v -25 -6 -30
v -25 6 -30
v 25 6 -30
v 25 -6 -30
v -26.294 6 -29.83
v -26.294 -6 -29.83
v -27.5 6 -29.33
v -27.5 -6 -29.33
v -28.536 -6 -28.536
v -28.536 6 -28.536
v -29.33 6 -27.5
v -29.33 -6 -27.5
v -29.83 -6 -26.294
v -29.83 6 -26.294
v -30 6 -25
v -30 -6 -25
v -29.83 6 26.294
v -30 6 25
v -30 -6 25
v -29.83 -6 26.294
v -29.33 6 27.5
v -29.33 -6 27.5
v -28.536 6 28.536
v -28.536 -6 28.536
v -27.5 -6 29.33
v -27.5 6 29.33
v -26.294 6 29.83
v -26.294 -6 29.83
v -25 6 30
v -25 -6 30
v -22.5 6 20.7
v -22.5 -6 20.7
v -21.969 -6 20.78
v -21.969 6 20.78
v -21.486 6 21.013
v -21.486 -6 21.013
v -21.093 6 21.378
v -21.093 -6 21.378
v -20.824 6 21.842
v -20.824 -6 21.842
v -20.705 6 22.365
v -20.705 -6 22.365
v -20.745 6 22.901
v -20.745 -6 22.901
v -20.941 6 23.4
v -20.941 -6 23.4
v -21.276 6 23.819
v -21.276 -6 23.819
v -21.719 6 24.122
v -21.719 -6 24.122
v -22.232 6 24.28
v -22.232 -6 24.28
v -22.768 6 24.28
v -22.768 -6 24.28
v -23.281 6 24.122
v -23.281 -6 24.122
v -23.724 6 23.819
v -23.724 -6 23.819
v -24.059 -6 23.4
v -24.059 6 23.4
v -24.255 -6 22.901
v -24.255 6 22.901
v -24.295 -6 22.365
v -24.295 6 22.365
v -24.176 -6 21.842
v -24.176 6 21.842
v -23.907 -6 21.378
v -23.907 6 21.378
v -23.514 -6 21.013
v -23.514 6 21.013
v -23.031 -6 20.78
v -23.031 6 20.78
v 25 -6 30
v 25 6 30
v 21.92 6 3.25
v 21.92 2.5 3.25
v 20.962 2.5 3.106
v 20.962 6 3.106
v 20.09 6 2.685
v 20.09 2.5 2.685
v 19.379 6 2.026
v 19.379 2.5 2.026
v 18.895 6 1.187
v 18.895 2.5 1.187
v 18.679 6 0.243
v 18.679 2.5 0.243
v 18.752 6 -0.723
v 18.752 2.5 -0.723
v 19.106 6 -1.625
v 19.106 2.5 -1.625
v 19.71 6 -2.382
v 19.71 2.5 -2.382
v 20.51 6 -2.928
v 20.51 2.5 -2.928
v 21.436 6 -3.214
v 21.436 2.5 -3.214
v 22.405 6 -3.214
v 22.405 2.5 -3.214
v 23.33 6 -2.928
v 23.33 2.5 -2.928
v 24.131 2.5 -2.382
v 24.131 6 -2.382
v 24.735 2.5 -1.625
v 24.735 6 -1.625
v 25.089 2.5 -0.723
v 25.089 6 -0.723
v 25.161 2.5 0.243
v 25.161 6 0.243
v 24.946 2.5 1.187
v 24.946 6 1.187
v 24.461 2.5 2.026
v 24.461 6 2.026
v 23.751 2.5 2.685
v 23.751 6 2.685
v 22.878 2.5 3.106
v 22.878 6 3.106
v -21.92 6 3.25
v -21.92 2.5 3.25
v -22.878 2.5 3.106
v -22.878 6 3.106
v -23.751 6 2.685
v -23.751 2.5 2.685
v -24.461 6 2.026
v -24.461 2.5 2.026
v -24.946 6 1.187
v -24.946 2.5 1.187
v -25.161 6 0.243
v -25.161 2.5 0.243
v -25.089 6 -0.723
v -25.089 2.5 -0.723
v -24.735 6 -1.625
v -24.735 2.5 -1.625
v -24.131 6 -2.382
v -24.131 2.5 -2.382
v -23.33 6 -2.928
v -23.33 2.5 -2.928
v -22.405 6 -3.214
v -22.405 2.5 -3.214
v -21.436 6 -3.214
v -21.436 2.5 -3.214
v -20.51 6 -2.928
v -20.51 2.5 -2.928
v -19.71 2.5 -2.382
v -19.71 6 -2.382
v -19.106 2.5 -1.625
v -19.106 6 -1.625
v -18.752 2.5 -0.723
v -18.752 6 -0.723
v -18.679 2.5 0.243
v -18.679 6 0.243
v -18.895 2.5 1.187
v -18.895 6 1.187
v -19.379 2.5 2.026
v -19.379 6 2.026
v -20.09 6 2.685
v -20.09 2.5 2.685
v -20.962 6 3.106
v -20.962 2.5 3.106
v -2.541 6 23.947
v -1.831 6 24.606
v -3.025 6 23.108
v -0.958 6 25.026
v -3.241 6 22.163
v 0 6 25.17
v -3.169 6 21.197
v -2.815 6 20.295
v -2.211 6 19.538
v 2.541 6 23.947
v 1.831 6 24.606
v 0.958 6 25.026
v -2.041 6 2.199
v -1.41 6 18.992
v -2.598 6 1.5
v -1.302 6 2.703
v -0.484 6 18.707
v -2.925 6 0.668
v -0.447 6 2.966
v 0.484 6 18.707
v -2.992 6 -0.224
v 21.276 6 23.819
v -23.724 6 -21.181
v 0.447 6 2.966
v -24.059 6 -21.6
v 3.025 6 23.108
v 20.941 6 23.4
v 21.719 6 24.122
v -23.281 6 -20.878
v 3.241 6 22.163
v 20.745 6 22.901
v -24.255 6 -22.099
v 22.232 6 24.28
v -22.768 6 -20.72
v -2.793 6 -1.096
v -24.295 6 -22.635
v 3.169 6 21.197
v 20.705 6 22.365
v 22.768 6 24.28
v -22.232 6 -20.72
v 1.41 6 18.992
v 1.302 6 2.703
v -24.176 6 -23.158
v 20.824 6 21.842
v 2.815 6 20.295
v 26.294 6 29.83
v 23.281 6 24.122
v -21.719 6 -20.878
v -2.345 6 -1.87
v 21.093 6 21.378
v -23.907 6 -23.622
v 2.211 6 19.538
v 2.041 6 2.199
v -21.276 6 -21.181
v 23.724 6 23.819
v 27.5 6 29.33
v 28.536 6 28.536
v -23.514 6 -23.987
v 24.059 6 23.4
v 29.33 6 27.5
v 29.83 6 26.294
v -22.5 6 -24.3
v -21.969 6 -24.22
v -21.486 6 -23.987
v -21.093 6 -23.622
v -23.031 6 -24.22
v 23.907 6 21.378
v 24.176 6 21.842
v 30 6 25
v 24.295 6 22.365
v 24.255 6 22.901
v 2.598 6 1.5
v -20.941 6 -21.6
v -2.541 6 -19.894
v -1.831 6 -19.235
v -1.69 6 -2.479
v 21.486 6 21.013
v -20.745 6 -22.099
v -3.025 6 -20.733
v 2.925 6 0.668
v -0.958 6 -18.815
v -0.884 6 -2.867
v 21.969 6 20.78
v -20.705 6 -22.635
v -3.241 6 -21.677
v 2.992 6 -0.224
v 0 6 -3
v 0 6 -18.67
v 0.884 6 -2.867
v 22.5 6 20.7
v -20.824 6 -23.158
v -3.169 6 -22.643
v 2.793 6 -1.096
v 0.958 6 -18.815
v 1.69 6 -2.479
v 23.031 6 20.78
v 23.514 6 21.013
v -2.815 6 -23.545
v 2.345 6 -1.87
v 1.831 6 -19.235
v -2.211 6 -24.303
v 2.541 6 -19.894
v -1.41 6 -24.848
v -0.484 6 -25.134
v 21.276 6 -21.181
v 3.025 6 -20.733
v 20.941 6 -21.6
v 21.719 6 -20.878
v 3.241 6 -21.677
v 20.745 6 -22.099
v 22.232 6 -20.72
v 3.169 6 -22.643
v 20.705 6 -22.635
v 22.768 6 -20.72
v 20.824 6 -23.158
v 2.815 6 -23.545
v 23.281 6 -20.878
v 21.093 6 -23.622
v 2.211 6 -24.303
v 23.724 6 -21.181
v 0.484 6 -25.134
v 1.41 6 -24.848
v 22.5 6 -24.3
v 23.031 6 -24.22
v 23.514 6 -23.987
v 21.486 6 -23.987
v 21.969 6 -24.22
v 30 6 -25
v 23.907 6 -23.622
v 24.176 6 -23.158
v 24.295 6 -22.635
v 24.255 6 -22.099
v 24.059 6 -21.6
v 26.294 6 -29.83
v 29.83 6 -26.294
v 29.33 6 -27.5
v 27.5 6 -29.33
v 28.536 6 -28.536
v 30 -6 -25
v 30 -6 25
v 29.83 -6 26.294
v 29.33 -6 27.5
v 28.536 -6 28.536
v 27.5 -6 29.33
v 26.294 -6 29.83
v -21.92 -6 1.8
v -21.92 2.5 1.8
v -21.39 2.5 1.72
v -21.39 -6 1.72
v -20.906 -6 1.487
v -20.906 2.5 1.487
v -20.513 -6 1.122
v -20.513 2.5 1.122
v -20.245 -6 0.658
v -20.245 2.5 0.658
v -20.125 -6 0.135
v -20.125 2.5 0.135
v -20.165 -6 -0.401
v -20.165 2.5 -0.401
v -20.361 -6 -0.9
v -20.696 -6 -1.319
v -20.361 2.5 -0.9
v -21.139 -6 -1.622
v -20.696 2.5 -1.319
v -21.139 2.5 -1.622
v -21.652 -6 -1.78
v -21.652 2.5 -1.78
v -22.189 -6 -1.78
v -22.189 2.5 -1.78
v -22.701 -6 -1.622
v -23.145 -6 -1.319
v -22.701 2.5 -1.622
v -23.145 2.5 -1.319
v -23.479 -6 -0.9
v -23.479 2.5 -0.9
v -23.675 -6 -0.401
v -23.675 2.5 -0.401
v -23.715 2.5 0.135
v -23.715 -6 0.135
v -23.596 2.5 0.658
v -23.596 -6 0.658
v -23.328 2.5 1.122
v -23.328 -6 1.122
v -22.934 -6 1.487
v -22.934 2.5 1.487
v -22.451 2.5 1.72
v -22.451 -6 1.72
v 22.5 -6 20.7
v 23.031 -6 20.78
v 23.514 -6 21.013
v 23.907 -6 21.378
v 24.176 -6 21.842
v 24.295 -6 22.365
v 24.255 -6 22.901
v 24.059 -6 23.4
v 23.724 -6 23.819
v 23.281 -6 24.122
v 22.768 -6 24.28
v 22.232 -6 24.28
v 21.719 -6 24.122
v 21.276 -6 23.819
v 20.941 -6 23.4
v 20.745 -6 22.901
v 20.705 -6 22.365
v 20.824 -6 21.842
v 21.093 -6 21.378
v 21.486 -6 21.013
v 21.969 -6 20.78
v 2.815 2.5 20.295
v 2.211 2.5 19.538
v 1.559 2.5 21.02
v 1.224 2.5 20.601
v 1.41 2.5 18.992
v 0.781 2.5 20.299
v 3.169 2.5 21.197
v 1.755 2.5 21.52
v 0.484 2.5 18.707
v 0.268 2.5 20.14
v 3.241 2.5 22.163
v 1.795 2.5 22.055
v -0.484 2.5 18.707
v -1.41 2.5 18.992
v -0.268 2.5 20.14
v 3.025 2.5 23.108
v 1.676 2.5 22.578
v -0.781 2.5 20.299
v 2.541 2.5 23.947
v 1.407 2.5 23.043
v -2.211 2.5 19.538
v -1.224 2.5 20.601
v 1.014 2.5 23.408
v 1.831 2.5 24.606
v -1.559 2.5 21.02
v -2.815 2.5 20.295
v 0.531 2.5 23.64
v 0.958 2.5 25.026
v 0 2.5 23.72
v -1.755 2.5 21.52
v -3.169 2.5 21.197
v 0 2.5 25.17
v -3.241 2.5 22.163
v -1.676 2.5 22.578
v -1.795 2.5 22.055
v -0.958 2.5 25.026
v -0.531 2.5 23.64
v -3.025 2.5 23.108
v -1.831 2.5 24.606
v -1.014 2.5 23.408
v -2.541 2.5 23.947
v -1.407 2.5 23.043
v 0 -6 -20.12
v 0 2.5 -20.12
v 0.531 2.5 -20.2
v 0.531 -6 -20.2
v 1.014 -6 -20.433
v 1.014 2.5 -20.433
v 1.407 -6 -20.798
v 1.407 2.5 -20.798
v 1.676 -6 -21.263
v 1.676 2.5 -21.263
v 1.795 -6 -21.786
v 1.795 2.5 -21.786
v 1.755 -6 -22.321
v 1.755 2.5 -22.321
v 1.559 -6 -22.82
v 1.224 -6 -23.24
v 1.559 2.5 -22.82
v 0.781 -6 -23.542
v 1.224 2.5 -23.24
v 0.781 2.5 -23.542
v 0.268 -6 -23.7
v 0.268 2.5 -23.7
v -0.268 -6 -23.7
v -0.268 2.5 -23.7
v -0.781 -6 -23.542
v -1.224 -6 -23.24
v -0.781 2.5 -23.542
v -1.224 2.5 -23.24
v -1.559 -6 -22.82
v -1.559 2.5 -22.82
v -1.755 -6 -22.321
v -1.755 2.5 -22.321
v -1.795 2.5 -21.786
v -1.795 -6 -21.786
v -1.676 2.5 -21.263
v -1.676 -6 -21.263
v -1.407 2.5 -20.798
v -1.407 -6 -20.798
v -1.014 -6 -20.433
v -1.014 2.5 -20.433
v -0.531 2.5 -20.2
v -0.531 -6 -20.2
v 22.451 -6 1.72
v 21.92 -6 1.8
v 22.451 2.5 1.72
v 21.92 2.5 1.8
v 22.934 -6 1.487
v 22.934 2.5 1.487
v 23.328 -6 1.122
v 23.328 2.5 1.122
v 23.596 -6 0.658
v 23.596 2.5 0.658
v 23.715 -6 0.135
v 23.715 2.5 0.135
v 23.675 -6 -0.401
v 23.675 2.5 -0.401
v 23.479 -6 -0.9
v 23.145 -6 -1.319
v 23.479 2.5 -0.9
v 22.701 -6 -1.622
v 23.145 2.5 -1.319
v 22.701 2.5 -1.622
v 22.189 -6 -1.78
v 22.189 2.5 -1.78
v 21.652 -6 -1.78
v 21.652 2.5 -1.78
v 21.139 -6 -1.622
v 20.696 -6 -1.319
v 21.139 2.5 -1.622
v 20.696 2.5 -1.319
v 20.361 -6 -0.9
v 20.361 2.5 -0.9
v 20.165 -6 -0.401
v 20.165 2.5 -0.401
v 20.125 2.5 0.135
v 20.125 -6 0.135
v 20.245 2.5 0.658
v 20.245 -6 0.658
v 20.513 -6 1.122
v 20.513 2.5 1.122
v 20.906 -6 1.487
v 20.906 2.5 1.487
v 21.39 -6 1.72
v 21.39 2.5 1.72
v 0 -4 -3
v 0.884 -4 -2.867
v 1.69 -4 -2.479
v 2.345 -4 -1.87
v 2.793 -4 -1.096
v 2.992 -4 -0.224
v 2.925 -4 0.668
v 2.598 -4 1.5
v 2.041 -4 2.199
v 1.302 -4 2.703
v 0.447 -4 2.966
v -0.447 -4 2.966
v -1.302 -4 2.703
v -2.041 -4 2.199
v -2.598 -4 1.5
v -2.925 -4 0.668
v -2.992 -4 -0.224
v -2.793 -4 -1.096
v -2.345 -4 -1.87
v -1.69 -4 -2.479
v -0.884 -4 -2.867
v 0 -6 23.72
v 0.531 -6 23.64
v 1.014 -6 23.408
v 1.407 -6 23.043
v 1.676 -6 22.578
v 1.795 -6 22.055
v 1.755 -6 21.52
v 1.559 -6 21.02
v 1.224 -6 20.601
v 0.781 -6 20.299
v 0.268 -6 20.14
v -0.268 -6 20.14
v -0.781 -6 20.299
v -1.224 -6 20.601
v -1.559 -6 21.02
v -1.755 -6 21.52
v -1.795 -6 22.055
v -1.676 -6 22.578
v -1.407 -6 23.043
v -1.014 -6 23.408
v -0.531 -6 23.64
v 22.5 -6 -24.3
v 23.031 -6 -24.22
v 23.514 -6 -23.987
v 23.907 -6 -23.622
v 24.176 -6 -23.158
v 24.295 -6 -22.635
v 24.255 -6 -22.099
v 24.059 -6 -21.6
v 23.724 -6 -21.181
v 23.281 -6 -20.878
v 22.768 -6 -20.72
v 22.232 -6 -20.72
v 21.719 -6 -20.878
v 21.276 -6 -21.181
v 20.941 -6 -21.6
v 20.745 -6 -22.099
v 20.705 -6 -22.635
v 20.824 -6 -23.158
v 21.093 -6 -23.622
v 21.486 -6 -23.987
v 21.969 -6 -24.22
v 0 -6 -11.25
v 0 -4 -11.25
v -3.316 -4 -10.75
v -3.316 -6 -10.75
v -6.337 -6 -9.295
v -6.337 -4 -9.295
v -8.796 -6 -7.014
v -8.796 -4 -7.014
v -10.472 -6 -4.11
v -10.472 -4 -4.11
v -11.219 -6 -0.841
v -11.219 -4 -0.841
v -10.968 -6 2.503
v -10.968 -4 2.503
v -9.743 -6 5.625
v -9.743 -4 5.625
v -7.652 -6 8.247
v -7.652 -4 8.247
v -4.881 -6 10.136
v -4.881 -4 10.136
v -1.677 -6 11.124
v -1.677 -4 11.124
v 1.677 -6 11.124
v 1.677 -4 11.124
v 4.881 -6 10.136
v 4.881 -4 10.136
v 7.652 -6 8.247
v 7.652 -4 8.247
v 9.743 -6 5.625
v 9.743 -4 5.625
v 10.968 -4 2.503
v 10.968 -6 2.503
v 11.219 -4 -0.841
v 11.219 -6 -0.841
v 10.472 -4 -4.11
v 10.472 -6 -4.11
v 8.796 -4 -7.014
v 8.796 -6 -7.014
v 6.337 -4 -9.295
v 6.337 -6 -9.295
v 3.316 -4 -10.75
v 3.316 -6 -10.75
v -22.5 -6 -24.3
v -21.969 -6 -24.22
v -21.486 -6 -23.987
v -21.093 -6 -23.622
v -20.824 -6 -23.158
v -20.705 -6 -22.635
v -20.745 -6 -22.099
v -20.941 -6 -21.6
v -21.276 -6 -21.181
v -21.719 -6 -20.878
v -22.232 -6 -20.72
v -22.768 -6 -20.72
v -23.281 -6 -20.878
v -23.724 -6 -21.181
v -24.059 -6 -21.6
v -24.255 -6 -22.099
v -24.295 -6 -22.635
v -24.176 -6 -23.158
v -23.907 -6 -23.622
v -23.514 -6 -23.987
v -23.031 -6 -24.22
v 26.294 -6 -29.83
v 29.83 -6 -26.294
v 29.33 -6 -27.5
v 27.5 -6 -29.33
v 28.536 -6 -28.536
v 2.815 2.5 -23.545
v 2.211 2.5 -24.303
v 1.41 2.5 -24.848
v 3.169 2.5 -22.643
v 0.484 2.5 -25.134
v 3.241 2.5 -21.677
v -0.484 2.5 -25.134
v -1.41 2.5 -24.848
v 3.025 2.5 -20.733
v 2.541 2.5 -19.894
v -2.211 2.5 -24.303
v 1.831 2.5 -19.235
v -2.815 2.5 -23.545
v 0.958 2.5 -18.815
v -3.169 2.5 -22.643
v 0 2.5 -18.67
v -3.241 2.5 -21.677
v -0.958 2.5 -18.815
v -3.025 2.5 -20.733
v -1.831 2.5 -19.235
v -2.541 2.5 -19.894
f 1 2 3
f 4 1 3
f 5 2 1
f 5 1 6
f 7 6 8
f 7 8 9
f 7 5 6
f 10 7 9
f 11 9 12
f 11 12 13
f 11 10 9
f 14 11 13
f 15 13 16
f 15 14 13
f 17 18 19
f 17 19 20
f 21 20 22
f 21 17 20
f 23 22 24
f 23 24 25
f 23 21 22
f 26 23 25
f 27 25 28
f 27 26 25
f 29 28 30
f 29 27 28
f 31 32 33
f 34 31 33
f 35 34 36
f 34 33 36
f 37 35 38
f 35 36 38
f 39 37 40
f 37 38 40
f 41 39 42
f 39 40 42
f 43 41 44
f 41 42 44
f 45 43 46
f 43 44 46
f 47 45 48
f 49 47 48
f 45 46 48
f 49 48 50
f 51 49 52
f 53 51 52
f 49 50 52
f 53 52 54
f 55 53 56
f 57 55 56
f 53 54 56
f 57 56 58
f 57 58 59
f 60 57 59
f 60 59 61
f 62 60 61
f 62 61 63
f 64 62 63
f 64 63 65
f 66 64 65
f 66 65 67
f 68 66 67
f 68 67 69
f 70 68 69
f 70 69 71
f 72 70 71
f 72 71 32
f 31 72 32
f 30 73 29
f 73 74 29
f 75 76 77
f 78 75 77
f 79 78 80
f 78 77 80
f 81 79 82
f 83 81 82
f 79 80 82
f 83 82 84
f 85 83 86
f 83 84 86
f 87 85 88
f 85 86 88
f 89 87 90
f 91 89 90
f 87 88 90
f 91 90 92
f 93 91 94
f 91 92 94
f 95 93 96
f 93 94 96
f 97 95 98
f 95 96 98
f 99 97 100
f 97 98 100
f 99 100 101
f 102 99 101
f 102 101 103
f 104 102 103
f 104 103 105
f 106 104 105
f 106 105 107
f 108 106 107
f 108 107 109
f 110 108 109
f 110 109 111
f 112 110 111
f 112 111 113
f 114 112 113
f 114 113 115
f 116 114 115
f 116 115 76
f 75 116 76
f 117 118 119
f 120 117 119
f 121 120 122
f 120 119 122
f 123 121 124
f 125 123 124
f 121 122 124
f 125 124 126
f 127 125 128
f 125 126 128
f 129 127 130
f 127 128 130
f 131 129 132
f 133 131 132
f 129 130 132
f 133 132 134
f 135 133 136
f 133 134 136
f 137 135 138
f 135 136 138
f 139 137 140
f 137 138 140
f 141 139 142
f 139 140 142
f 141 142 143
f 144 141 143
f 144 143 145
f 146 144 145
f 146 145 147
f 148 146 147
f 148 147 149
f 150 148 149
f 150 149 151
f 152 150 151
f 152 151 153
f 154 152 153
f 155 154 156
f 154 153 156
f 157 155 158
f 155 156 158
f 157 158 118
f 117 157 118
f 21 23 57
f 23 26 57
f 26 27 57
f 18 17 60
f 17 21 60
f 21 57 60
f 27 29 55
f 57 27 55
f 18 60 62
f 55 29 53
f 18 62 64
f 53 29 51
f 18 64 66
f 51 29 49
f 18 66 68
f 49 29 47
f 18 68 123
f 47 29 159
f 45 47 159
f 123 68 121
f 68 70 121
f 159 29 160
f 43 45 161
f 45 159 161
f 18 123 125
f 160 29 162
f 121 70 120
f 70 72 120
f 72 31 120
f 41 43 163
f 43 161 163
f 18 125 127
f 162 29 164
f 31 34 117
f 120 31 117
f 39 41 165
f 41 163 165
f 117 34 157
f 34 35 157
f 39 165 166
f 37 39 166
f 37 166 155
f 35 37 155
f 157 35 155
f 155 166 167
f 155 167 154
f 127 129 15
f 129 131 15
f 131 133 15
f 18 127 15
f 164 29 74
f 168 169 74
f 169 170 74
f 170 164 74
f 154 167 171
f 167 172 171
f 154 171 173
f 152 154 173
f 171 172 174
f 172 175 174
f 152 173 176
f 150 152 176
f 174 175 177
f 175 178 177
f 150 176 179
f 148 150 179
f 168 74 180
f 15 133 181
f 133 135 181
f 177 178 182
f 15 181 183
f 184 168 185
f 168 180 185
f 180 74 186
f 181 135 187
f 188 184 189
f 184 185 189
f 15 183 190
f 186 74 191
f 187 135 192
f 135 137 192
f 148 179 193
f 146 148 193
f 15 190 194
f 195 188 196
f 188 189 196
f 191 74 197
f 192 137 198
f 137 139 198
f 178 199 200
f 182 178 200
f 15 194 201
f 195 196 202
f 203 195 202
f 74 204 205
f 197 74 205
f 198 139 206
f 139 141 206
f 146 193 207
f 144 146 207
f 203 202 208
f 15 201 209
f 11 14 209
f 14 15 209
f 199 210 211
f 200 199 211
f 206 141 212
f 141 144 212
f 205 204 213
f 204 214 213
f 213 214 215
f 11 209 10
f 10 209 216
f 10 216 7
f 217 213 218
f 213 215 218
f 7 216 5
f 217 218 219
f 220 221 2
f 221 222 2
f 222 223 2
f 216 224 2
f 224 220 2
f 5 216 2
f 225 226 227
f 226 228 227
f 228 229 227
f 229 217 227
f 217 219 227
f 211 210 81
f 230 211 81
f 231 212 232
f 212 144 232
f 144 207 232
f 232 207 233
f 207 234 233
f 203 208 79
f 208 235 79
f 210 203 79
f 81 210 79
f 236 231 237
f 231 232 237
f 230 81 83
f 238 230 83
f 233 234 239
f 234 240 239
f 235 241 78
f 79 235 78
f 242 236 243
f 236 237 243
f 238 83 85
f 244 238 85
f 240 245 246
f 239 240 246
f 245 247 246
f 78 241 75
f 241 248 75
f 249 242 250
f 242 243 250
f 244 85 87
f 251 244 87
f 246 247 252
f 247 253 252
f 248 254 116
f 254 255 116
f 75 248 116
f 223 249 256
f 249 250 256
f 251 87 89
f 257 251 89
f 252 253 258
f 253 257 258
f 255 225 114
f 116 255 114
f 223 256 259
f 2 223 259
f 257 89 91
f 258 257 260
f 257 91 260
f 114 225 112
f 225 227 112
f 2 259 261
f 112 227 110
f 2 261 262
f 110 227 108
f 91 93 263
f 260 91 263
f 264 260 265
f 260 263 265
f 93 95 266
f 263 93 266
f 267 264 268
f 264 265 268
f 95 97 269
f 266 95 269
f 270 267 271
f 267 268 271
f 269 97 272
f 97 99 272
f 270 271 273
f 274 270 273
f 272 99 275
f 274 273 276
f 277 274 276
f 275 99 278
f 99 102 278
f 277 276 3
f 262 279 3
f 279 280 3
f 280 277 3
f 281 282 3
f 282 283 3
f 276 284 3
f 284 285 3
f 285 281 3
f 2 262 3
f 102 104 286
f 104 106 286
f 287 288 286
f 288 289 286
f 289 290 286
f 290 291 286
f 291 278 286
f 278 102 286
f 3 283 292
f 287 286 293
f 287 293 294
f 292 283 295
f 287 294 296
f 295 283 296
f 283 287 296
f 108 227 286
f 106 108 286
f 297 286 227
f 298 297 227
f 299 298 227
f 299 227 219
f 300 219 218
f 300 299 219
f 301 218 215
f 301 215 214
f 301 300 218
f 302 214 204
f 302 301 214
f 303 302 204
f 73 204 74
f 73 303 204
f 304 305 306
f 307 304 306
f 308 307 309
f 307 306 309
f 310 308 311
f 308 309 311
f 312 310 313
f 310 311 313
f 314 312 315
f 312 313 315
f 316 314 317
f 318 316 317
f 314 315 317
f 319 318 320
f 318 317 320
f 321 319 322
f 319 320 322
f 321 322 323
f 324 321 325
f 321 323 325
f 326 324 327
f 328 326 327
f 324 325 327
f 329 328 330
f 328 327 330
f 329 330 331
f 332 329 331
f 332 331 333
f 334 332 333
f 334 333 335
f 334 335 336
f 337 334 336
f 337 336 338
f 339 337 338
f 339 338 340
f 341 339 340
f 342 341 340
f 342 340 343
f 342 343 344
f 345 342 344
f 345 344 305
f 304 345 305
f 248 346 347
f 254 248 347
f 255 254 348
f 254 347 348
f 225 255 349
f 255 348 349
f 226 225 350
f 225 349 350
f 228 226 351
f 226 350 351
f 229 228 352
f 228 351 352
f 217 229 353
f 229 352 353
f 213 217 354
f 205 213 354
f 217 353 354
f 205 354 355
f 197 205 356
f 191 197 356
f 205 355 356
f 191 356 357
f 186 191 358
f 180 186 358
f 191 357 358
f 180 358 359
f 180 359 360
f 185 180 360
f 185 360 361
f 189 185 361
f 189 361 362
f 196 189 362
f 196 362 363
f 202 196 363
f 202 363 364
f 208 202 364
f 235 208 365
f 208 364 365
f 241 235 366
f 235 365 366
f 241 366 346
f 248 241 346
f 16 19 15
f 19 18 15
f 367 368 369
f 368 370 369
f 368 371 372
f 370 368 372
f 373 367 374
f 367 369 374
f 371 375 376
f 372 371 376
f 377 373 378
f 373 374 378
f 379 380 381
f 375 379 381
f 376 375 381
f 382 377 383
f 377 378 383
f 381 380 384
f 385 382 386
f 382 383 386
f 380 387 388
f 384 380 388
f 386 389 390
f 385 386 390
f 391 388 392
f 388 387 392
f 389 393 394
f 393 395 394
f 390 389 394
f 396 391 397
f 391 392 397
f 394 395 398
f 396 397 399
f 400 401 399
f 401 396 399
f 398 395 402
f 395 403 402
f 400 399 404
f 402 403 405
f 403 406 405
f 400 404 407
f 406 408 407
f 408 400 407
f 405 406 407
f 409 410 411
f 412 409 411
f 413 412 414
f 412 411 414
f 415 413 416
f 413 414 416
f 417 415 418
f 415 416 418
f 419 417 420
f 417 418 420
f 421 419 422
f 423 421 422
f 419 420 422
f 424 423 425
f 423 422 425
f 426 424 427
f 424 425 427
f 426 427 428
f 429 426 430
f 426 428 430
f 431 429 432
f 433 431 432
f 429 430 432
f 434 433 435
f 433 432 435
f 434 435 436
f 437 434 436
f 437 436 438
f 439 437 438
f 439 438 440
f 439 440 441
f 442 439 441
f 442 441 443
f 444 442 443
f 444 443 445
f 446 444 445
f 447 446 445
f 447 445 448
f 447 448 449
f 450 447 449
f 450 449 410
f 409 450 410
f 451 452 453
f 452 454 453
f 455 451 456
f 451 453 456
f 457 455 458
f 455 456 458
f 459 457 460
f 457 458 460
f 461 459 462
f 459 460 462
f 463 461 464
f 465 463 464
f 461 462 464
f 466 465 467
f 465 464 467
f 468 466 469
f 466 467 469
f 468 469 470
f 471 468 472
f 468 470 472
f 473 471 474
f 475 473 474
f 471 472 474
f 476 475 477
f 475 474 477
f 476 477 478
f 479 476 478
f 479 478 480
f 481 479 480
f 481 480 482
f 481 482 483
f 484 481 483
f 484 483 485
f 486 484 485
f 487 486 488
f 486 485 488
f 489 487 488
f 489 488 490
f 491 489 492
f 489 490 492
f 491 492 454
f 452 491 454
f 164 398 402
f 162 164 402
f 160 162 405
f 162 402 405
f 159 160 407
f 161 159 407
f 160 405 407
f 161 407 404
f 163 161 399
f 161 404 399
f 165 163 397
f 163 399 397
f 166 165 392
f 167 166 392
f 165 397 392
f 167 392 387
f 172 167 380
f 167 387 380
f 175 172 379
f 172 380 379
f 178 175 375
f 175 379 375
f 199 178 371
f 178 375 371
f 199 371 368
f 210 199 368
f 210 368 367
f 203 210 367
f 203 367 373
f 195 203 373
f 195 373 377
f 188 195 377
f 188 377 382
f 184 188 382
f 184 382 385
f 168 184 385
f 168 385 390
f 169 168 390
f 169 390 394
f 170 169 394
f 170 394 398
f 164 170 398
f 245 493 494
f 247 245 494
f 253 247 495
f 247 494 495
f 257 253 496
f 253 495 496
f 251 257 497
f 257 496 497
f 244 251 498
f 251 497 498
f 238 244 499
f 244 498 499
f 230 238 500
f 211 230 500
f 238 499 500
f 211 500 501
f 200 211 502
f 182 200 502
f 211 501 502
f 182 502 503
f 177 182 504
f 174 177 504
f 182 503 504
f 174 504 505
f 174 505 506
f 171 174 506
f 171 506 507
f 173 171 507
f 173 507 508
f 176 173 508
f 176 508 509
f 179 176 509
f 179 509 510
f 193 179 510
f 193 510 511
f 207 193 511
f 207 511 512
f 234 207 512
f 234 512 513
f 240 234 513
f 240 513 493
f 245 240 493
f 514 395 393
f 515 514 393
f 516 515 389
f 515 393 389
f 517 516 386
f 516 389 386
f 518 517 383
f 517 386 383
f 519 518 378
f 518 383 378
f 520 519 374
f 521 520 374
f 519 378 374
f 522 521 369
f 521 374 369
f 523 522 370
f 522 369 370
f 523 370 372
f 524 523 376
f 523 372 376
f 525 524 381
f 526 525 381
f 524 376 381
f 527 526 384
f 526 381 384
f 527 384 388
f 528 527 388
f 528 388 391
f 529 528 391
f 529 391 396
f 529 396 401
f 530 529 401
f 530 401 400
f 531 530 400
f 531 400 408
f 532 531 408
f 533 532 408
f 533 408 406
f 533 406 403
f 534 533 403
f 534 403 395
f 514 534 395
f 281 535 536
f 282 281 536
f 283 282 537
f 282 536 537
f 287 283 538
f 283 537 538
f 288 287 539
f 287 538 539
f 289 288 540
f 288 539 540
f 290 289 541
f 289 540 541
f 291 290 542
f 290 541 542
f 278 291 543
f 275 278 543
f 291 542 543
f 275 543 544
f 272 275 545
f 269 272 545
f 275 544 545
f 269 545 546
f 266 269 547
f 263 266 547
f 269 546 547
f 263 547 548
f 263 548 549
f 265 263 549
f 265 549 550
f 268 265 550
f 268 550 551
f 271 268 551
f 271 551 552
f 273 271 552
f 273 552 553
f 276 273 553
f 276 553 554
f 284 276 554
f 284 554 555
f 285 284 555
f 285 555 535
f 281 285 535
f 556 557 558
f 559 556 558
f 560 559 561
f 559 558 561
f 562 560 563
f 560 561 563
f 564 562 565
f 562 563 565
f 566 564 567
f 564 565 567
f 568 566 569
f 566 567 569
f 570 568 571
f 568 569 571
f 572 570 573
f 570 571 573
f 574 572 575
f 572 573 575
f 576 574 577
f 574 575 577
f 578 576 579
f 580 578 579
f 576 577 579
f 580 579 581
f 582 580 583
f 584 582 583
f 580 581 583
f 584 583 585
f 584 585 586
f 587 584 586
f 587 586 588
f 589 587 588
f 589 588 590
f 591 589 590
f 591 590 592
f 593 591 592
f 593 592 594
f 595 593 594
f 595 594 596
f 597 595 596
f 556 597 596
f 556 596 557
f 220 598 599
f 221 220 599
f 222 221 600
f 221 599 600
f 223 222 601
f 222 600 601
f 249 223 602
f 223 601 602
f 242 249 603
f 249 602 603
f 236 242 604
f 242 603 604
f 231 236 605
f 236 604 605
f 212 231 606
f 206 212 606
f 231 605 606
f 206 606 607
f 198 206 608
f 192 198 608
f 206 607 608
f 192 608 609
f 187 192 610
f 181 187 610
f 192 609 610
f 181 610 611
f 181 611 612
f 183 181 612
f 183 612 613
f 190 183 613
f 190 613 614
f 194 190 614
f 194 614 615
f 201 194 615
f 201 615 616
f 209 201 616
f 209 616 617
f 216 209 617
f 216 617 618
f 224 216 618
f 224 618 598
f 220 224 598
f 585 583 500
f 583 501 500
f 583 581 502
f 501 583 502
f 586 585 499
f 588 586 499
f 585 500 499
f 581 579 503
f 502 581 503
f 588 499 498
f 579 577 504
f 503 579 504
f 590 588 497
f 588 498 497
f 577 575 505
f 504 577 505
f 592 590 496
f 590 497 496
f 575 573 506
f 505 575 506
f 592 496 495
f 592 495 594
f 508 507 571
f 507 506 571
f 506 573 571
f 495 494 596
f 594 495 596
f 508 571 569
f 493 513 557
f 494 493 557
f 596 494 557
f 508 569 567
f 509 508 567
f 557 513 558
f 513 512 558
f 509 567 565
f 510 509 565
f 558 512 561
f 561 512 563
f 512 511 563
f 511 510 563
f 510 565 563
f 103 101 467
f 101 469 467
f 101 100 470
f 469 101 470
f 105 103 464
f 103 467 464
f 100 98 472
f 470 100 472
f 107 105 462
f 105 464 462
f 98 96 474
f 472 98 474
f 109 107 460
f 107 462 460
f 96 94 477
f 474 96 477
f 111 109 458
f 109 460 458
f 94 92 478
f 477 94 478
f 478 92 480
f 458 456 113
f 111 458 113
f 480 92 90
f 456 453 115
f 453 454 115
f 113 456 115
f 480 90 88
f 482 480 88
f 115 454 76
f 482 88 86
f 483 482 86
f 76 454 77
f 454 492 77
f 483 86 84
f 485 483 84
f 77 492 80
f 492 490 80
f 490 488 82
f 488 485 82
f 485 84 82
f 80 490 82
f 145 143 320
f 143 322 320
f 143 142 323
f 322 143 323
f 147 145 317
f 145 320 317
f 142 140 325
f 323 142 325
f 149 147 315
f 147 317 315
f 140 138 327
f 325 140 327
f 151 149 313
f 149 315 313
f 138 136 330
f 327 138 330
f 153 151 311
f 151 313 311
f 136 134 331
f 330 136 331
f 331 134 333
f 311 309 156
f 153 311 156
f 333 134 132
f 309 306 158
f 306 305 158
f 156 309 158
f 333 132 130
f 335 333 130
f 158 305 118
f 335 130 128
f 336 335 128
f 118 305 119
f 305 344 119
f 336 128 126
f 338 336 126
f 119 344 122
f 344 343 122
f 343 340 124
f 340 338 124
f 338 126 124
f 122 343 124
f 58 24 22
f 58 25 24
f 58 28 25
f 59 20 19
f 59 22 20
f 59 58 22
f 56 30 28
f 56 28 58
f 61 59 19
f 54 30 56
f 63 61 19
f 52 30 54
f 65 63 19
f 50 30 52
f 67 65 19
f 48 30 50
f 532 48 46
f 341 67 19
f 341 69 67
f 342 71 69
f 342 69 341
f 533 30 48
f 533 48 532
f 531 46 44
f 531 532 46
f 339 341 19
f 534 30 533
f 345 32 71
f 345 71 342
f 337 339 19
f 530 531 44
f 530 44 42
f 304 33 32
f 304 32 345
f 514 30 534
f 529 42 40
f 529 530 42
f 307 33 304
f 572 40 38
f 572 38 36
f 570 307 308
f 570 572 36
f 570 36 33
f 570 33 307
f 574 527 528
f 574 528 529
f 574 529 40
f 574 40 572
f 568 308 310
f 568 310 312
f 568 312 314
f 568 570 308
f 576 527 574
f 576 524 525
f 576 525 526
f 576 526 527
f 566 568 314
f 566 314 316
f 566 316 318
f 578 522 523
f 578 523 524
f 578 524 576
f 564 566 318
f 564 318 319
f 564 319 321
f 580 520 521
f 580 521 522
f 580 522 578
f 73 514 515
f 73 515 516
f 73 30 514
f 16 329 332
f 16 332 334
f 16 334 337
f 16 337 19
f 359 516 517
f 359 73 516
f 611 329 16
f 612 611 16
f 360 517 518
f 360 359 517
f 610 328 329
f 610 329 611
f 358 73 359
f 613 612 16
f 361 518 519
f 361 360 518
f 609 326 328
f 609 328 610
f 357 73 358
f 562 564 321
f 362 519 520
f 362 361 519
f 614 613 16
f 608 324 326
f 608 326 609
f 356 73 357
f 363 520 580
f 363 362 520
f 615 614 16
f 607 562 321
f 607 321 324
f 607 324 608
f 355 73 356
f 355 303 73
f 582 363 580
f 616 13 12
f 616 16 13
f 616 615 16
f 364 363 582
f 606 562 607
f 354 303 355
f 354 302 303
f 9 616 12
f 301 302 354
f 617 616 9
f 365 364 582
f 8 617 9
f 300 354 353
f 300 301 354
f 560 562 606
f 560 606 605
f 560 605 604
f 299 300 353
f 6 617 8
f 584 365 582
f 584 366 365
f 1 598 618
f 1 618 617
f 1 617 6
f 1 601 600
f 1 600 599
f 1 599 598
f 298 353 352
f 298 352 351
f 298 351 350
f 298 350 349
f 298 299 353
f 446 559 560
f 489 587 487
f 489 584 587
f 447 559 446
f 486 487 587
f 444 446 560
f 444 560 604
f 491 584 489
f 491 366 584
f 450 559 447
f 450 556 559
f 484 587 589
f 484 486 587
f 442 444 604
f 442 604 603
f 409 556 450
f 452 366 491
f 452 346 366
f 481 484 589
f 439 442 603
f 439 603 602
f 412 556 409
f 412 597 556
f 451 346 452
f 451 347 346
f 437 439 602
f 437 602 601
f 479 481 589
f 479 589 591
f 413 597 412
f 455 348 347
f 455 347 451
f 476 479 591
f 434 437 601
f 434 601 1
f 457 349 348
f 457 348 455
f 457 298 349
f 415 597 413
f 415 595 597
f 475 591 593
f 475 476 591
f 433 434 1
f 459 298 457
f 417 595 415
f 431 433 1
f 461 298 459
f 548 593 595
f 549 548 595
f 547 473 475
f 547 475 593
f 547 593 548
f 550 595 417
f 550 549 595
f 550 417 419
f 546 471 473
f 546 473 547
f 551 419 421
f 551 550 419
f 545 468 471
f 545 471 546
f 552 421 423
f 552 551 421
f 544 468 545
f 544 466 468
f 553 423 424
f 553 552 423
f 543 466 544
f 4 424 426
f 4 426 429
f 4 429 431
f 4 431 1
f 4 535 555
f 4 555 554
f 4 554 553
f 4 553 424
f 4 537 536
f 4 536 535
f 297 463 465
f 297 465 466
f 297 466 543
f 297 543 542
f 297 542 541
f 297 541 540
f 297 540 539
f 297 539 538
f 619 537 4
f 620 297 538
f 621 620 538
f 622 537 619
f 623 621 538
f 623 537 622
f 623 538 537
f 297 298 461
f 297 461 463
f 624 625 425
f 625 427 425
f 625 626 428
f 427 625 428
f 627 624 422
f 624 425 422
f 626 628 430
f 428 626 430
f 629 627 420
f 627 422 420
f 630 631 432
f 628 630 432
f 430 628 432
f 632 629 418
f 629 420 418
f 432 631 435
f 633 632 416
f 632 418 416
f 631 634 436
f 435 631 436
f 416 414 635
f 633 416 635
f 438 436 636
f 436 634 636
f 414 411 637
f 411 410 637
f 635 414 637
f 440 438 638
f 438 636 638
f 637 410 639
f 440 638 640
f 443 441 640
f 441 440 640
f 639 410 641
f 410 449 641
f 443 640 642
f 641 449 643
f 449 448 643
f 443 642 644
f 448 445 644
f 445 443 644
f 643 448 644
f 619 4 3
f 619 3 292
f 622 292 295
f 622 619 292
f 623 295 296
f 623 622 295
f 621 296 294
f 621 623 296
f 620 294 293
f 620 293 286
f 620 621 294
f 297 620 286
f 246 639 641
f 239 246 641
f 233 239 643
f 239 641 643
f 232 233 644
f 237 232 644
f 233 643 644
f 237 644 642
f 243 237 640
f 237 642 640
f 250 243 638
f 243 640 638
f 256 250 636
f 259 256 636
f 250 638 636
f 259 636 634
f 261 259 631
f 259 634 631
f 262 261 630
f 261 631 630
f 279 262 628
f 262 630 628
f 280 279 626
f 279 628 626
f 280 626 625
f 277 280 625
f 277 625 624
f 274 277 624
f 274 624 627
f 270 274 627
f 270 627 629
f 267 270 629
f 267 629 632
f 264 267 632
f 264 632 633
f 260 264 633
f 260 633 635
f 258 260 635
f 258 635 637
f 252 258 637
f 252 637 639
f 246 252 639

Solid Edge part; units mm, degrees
sketch "Sketch1" plane through (0, 0, 0) normal (0, -1, 0) x (1, 0, 0)
  line L0 (-30, -30) -> (30, -30)
  line L1 (30, -30) -> (30, 30)
  line L2 (30, 30) -> (-30, 30)
  line L3 (-30, 30) -> (-30, -30)
  dimension "D1" = 60
extrude "Protrusion1" add sketch "Sketch1" along normal mid plane 12
fillet "Round_1" radius 5 4 edges at (30, 0, 30) (30, 0, -30) (-30, 0, -30) (-30, 0, 30)
hole "Hole_1" at (-22.5, -6, 22.5) direction (0, 1, 0) diameter 3.6 end up to next
hole "Hole1" at (22.5, -6, 22.5) direction (0, 1, 0) diameter 3.6 end up to next
hole "Hole2" at (22.5, -6, -22.5) direction (0, 1, 0) diameter 3.6 end up to next
hole "Hole3" at (-22.5, -6, -22.5) direction (0, 1, 0) diameter 3.6 end up to next
hole "Hole_5" at (0, -6, 0) direction (0, 1, 0) diameter 6 end up to next counterbore diameter 22.5 counterbore depth 2
hole "Hole_6" at (0, 6, 21.9203) direction (0, -1, 0) diameter 3.6 end up to next counterbore diameter 6.5 counterbore depth 3.5
hole "Hole4" at (-21.9203, 6, 0) direction (0, -1, 0) diameter 3.6 end up to next counterbore diameter 6.5 counterbore depth 3.5
hole "Hole5" at (0, 6, -21.9203) direction (0, -1, 0) diameter 3.6 end up to next counterbore diameter 6.5 counterbore depth 3.5
hole "Hole6" at (21.9203, 6, 0) direction (0, -1, 0) diameter 3.6 end up to next counterbore diameter 6.5 counterbore depth 3.5
properties material "Polyethylene, low density"
